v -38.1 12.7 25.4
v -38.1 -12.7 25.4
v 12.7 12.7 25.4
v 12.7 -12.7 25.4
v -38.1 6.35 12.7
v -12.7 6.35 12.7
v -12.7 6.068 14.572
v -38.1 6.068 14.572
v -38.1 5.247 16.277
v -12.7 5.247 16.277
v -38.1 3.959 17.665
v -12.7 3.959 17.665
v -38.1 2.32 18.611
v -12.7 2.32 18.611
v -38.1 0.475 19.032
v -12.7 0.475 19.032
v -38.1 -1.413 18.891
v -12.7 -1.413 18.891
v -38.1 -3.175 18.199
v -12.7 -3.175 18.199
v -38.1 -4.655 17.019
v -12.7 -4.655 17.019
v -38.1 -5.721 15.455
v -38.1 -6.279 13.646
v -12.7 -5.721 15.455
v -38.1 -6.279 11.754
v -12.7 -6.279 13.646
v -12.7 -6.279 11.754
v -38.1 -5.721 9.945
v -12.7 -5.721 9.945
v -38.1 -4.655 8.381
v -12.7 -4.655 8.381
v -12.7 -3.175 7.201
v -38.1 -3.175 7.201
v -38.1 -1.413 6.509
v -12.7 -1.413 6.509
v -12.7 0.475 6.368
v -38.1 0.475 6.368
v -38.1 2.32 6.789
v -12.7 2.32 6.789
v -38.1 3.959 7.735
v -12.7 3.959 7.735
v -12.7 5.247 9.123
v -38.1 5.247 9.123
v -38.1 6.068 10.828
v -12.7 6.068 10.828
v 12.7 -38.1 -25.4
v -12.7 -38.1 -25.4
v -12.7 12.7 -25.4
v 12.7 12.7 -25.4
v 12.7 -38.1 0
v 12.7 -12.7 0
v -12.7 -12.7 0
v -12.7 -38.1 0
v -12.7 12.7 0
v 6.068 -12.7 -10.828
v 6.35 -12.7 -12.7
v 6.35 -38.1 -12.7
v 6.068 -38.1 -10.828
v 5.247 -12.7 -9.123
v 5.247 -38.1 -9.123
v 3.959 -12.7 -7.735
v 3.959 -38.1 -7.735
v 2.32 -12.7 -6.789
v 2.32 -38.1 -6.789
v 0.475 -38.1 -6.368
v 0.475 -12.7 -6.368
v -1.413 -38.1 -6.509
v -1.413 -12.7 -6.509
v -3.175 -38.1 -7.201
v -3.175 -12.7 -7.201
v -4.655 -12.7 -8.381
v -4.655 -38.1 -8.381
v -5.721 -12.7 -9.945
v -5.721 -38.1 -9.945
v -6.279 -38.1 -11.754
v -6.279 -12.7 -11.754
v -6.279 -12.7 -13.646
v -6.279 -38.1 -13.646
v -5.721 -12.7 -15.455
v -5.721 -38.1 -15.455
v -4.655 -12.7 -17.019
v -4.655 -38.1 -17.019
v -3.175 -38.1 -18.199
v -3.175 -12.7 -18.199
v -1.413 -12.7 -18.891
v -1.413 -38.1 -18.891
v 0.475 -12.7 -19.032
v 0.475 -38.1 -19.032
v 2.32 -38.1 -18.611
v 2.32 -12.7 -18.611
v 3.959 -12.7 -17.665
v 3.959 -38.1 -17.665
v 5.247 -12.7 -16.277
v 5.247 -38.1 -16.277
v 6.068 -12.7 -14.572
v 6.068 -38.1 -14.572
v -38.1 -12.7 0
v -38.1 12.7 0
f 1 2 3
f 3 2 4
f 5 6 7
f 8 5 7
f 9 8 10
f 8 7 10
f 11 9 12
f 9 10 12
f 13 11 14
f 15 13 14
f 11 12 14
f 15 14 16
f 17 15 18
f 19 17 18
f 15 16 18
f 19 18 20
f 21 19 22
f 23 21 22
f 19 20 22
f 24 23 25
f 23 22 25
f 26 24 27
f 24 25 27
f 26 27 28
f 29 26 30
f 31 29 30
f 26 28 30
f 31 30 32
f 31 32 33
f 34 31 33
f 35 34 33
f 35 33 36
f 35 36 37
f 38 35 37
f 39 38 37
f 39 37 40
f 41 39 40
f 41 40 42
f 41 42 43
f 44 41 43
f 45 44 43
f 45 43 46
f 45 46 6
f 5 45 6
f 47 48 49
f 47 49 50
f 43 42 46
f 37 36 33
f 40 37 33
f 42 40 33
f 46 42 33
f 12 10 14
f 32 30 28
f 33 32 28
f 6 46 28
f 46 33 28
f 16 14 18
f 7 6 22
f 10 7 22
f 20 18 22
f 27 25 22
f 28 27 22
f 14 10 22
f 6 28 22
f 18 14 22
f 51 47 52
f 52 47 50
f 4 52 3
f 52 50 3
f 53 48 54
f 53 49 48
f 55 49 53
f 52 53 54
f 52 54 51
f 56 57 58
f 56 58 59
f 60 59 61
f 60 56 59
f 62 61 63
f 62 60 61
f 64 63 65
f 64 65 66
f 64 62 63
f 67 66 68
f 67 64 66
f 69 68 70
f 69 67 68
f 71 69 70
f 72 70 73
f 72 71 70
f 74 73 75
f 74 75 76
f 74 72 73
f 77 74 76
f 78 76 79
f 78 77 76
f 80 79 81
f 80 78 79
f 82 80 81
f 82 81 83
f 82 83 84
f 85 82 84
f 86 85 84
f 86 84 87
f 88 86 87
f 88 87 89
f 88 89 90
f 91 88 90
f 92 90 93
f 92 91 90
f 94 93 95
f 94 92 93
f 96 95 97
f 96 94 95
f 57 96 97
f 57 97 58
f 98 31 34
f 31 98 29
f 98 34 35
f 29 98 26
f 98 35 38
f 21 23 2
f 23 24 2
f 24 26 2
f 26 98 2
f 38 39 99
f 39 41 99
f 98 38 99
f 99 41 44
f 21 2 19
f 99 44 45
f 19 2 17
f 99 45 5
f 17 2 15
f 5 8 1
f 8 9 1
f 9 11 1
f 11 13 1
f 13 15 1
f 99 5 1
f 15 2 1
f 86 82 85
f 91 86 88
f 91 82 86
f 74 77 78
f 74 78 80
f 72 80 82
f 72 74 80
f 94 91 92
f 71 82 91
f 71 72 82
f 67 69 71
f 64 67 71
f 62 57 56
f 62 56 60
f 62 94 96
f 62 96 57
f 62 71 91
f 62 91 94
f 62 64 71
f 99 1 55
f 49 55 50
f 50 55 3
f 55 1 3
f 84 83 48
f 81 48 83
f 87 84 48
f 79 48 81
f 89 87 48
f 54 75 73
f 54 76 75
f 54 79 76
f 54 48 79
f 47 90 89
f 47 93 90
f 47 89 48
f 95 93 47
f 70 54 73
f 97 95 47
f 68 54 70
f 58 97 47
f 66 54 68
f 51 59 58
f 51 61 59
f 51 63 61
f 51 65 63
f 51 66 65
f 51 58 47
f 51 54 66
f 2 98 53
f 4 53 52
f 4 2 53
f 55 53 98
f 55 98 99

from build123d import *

# Parameters (mm, degrees)
F0_W     = 25.4
F0_H     = 50.8
F1_DEPTH = 12.7
F3_W     = 25.4
F3_H     = 25.4
F3_R     = 6.35
F4_DEPTH = 50.8
F2_W     = 25.4
F2_H     = 25.4
F2_R     = 6.35
F5_DEPTH = 25.4


with BuildPart() as f1:
    # F0 (on Front) → F1 (new body, symmetric)
    with BuildSketch(Plane.XZ):
        Rectangle(F0_W, F0_H)
    extrude(amount=F1_DEPTH, both=True)

    # F3 (on face) → F4 (join)
    with BuildSketch(Plane.YZ.offset(12.7)):
        with Locations((0, 12.7)):
            Rectangle(F3_W, F3_H)
        with Locations((0, 12.7)):
            Circle(F3_R, mode=Mode.SUBTRACT)
    extrude(amount=-F4_DEPTH)

    # F2 (on face) → F5 (join)
    with BuildSketch(Plane.XZ.offset(12.7)):
        with Locations((0, -12.7)):
            Rectangle(F2_W, F2_H)
        with Locations((0, -12.7)):
            Circle(F2_R, mode=Mode.SUBTRACT)
    extrude(amount=F5_DEPTH)


solid = f1.part
